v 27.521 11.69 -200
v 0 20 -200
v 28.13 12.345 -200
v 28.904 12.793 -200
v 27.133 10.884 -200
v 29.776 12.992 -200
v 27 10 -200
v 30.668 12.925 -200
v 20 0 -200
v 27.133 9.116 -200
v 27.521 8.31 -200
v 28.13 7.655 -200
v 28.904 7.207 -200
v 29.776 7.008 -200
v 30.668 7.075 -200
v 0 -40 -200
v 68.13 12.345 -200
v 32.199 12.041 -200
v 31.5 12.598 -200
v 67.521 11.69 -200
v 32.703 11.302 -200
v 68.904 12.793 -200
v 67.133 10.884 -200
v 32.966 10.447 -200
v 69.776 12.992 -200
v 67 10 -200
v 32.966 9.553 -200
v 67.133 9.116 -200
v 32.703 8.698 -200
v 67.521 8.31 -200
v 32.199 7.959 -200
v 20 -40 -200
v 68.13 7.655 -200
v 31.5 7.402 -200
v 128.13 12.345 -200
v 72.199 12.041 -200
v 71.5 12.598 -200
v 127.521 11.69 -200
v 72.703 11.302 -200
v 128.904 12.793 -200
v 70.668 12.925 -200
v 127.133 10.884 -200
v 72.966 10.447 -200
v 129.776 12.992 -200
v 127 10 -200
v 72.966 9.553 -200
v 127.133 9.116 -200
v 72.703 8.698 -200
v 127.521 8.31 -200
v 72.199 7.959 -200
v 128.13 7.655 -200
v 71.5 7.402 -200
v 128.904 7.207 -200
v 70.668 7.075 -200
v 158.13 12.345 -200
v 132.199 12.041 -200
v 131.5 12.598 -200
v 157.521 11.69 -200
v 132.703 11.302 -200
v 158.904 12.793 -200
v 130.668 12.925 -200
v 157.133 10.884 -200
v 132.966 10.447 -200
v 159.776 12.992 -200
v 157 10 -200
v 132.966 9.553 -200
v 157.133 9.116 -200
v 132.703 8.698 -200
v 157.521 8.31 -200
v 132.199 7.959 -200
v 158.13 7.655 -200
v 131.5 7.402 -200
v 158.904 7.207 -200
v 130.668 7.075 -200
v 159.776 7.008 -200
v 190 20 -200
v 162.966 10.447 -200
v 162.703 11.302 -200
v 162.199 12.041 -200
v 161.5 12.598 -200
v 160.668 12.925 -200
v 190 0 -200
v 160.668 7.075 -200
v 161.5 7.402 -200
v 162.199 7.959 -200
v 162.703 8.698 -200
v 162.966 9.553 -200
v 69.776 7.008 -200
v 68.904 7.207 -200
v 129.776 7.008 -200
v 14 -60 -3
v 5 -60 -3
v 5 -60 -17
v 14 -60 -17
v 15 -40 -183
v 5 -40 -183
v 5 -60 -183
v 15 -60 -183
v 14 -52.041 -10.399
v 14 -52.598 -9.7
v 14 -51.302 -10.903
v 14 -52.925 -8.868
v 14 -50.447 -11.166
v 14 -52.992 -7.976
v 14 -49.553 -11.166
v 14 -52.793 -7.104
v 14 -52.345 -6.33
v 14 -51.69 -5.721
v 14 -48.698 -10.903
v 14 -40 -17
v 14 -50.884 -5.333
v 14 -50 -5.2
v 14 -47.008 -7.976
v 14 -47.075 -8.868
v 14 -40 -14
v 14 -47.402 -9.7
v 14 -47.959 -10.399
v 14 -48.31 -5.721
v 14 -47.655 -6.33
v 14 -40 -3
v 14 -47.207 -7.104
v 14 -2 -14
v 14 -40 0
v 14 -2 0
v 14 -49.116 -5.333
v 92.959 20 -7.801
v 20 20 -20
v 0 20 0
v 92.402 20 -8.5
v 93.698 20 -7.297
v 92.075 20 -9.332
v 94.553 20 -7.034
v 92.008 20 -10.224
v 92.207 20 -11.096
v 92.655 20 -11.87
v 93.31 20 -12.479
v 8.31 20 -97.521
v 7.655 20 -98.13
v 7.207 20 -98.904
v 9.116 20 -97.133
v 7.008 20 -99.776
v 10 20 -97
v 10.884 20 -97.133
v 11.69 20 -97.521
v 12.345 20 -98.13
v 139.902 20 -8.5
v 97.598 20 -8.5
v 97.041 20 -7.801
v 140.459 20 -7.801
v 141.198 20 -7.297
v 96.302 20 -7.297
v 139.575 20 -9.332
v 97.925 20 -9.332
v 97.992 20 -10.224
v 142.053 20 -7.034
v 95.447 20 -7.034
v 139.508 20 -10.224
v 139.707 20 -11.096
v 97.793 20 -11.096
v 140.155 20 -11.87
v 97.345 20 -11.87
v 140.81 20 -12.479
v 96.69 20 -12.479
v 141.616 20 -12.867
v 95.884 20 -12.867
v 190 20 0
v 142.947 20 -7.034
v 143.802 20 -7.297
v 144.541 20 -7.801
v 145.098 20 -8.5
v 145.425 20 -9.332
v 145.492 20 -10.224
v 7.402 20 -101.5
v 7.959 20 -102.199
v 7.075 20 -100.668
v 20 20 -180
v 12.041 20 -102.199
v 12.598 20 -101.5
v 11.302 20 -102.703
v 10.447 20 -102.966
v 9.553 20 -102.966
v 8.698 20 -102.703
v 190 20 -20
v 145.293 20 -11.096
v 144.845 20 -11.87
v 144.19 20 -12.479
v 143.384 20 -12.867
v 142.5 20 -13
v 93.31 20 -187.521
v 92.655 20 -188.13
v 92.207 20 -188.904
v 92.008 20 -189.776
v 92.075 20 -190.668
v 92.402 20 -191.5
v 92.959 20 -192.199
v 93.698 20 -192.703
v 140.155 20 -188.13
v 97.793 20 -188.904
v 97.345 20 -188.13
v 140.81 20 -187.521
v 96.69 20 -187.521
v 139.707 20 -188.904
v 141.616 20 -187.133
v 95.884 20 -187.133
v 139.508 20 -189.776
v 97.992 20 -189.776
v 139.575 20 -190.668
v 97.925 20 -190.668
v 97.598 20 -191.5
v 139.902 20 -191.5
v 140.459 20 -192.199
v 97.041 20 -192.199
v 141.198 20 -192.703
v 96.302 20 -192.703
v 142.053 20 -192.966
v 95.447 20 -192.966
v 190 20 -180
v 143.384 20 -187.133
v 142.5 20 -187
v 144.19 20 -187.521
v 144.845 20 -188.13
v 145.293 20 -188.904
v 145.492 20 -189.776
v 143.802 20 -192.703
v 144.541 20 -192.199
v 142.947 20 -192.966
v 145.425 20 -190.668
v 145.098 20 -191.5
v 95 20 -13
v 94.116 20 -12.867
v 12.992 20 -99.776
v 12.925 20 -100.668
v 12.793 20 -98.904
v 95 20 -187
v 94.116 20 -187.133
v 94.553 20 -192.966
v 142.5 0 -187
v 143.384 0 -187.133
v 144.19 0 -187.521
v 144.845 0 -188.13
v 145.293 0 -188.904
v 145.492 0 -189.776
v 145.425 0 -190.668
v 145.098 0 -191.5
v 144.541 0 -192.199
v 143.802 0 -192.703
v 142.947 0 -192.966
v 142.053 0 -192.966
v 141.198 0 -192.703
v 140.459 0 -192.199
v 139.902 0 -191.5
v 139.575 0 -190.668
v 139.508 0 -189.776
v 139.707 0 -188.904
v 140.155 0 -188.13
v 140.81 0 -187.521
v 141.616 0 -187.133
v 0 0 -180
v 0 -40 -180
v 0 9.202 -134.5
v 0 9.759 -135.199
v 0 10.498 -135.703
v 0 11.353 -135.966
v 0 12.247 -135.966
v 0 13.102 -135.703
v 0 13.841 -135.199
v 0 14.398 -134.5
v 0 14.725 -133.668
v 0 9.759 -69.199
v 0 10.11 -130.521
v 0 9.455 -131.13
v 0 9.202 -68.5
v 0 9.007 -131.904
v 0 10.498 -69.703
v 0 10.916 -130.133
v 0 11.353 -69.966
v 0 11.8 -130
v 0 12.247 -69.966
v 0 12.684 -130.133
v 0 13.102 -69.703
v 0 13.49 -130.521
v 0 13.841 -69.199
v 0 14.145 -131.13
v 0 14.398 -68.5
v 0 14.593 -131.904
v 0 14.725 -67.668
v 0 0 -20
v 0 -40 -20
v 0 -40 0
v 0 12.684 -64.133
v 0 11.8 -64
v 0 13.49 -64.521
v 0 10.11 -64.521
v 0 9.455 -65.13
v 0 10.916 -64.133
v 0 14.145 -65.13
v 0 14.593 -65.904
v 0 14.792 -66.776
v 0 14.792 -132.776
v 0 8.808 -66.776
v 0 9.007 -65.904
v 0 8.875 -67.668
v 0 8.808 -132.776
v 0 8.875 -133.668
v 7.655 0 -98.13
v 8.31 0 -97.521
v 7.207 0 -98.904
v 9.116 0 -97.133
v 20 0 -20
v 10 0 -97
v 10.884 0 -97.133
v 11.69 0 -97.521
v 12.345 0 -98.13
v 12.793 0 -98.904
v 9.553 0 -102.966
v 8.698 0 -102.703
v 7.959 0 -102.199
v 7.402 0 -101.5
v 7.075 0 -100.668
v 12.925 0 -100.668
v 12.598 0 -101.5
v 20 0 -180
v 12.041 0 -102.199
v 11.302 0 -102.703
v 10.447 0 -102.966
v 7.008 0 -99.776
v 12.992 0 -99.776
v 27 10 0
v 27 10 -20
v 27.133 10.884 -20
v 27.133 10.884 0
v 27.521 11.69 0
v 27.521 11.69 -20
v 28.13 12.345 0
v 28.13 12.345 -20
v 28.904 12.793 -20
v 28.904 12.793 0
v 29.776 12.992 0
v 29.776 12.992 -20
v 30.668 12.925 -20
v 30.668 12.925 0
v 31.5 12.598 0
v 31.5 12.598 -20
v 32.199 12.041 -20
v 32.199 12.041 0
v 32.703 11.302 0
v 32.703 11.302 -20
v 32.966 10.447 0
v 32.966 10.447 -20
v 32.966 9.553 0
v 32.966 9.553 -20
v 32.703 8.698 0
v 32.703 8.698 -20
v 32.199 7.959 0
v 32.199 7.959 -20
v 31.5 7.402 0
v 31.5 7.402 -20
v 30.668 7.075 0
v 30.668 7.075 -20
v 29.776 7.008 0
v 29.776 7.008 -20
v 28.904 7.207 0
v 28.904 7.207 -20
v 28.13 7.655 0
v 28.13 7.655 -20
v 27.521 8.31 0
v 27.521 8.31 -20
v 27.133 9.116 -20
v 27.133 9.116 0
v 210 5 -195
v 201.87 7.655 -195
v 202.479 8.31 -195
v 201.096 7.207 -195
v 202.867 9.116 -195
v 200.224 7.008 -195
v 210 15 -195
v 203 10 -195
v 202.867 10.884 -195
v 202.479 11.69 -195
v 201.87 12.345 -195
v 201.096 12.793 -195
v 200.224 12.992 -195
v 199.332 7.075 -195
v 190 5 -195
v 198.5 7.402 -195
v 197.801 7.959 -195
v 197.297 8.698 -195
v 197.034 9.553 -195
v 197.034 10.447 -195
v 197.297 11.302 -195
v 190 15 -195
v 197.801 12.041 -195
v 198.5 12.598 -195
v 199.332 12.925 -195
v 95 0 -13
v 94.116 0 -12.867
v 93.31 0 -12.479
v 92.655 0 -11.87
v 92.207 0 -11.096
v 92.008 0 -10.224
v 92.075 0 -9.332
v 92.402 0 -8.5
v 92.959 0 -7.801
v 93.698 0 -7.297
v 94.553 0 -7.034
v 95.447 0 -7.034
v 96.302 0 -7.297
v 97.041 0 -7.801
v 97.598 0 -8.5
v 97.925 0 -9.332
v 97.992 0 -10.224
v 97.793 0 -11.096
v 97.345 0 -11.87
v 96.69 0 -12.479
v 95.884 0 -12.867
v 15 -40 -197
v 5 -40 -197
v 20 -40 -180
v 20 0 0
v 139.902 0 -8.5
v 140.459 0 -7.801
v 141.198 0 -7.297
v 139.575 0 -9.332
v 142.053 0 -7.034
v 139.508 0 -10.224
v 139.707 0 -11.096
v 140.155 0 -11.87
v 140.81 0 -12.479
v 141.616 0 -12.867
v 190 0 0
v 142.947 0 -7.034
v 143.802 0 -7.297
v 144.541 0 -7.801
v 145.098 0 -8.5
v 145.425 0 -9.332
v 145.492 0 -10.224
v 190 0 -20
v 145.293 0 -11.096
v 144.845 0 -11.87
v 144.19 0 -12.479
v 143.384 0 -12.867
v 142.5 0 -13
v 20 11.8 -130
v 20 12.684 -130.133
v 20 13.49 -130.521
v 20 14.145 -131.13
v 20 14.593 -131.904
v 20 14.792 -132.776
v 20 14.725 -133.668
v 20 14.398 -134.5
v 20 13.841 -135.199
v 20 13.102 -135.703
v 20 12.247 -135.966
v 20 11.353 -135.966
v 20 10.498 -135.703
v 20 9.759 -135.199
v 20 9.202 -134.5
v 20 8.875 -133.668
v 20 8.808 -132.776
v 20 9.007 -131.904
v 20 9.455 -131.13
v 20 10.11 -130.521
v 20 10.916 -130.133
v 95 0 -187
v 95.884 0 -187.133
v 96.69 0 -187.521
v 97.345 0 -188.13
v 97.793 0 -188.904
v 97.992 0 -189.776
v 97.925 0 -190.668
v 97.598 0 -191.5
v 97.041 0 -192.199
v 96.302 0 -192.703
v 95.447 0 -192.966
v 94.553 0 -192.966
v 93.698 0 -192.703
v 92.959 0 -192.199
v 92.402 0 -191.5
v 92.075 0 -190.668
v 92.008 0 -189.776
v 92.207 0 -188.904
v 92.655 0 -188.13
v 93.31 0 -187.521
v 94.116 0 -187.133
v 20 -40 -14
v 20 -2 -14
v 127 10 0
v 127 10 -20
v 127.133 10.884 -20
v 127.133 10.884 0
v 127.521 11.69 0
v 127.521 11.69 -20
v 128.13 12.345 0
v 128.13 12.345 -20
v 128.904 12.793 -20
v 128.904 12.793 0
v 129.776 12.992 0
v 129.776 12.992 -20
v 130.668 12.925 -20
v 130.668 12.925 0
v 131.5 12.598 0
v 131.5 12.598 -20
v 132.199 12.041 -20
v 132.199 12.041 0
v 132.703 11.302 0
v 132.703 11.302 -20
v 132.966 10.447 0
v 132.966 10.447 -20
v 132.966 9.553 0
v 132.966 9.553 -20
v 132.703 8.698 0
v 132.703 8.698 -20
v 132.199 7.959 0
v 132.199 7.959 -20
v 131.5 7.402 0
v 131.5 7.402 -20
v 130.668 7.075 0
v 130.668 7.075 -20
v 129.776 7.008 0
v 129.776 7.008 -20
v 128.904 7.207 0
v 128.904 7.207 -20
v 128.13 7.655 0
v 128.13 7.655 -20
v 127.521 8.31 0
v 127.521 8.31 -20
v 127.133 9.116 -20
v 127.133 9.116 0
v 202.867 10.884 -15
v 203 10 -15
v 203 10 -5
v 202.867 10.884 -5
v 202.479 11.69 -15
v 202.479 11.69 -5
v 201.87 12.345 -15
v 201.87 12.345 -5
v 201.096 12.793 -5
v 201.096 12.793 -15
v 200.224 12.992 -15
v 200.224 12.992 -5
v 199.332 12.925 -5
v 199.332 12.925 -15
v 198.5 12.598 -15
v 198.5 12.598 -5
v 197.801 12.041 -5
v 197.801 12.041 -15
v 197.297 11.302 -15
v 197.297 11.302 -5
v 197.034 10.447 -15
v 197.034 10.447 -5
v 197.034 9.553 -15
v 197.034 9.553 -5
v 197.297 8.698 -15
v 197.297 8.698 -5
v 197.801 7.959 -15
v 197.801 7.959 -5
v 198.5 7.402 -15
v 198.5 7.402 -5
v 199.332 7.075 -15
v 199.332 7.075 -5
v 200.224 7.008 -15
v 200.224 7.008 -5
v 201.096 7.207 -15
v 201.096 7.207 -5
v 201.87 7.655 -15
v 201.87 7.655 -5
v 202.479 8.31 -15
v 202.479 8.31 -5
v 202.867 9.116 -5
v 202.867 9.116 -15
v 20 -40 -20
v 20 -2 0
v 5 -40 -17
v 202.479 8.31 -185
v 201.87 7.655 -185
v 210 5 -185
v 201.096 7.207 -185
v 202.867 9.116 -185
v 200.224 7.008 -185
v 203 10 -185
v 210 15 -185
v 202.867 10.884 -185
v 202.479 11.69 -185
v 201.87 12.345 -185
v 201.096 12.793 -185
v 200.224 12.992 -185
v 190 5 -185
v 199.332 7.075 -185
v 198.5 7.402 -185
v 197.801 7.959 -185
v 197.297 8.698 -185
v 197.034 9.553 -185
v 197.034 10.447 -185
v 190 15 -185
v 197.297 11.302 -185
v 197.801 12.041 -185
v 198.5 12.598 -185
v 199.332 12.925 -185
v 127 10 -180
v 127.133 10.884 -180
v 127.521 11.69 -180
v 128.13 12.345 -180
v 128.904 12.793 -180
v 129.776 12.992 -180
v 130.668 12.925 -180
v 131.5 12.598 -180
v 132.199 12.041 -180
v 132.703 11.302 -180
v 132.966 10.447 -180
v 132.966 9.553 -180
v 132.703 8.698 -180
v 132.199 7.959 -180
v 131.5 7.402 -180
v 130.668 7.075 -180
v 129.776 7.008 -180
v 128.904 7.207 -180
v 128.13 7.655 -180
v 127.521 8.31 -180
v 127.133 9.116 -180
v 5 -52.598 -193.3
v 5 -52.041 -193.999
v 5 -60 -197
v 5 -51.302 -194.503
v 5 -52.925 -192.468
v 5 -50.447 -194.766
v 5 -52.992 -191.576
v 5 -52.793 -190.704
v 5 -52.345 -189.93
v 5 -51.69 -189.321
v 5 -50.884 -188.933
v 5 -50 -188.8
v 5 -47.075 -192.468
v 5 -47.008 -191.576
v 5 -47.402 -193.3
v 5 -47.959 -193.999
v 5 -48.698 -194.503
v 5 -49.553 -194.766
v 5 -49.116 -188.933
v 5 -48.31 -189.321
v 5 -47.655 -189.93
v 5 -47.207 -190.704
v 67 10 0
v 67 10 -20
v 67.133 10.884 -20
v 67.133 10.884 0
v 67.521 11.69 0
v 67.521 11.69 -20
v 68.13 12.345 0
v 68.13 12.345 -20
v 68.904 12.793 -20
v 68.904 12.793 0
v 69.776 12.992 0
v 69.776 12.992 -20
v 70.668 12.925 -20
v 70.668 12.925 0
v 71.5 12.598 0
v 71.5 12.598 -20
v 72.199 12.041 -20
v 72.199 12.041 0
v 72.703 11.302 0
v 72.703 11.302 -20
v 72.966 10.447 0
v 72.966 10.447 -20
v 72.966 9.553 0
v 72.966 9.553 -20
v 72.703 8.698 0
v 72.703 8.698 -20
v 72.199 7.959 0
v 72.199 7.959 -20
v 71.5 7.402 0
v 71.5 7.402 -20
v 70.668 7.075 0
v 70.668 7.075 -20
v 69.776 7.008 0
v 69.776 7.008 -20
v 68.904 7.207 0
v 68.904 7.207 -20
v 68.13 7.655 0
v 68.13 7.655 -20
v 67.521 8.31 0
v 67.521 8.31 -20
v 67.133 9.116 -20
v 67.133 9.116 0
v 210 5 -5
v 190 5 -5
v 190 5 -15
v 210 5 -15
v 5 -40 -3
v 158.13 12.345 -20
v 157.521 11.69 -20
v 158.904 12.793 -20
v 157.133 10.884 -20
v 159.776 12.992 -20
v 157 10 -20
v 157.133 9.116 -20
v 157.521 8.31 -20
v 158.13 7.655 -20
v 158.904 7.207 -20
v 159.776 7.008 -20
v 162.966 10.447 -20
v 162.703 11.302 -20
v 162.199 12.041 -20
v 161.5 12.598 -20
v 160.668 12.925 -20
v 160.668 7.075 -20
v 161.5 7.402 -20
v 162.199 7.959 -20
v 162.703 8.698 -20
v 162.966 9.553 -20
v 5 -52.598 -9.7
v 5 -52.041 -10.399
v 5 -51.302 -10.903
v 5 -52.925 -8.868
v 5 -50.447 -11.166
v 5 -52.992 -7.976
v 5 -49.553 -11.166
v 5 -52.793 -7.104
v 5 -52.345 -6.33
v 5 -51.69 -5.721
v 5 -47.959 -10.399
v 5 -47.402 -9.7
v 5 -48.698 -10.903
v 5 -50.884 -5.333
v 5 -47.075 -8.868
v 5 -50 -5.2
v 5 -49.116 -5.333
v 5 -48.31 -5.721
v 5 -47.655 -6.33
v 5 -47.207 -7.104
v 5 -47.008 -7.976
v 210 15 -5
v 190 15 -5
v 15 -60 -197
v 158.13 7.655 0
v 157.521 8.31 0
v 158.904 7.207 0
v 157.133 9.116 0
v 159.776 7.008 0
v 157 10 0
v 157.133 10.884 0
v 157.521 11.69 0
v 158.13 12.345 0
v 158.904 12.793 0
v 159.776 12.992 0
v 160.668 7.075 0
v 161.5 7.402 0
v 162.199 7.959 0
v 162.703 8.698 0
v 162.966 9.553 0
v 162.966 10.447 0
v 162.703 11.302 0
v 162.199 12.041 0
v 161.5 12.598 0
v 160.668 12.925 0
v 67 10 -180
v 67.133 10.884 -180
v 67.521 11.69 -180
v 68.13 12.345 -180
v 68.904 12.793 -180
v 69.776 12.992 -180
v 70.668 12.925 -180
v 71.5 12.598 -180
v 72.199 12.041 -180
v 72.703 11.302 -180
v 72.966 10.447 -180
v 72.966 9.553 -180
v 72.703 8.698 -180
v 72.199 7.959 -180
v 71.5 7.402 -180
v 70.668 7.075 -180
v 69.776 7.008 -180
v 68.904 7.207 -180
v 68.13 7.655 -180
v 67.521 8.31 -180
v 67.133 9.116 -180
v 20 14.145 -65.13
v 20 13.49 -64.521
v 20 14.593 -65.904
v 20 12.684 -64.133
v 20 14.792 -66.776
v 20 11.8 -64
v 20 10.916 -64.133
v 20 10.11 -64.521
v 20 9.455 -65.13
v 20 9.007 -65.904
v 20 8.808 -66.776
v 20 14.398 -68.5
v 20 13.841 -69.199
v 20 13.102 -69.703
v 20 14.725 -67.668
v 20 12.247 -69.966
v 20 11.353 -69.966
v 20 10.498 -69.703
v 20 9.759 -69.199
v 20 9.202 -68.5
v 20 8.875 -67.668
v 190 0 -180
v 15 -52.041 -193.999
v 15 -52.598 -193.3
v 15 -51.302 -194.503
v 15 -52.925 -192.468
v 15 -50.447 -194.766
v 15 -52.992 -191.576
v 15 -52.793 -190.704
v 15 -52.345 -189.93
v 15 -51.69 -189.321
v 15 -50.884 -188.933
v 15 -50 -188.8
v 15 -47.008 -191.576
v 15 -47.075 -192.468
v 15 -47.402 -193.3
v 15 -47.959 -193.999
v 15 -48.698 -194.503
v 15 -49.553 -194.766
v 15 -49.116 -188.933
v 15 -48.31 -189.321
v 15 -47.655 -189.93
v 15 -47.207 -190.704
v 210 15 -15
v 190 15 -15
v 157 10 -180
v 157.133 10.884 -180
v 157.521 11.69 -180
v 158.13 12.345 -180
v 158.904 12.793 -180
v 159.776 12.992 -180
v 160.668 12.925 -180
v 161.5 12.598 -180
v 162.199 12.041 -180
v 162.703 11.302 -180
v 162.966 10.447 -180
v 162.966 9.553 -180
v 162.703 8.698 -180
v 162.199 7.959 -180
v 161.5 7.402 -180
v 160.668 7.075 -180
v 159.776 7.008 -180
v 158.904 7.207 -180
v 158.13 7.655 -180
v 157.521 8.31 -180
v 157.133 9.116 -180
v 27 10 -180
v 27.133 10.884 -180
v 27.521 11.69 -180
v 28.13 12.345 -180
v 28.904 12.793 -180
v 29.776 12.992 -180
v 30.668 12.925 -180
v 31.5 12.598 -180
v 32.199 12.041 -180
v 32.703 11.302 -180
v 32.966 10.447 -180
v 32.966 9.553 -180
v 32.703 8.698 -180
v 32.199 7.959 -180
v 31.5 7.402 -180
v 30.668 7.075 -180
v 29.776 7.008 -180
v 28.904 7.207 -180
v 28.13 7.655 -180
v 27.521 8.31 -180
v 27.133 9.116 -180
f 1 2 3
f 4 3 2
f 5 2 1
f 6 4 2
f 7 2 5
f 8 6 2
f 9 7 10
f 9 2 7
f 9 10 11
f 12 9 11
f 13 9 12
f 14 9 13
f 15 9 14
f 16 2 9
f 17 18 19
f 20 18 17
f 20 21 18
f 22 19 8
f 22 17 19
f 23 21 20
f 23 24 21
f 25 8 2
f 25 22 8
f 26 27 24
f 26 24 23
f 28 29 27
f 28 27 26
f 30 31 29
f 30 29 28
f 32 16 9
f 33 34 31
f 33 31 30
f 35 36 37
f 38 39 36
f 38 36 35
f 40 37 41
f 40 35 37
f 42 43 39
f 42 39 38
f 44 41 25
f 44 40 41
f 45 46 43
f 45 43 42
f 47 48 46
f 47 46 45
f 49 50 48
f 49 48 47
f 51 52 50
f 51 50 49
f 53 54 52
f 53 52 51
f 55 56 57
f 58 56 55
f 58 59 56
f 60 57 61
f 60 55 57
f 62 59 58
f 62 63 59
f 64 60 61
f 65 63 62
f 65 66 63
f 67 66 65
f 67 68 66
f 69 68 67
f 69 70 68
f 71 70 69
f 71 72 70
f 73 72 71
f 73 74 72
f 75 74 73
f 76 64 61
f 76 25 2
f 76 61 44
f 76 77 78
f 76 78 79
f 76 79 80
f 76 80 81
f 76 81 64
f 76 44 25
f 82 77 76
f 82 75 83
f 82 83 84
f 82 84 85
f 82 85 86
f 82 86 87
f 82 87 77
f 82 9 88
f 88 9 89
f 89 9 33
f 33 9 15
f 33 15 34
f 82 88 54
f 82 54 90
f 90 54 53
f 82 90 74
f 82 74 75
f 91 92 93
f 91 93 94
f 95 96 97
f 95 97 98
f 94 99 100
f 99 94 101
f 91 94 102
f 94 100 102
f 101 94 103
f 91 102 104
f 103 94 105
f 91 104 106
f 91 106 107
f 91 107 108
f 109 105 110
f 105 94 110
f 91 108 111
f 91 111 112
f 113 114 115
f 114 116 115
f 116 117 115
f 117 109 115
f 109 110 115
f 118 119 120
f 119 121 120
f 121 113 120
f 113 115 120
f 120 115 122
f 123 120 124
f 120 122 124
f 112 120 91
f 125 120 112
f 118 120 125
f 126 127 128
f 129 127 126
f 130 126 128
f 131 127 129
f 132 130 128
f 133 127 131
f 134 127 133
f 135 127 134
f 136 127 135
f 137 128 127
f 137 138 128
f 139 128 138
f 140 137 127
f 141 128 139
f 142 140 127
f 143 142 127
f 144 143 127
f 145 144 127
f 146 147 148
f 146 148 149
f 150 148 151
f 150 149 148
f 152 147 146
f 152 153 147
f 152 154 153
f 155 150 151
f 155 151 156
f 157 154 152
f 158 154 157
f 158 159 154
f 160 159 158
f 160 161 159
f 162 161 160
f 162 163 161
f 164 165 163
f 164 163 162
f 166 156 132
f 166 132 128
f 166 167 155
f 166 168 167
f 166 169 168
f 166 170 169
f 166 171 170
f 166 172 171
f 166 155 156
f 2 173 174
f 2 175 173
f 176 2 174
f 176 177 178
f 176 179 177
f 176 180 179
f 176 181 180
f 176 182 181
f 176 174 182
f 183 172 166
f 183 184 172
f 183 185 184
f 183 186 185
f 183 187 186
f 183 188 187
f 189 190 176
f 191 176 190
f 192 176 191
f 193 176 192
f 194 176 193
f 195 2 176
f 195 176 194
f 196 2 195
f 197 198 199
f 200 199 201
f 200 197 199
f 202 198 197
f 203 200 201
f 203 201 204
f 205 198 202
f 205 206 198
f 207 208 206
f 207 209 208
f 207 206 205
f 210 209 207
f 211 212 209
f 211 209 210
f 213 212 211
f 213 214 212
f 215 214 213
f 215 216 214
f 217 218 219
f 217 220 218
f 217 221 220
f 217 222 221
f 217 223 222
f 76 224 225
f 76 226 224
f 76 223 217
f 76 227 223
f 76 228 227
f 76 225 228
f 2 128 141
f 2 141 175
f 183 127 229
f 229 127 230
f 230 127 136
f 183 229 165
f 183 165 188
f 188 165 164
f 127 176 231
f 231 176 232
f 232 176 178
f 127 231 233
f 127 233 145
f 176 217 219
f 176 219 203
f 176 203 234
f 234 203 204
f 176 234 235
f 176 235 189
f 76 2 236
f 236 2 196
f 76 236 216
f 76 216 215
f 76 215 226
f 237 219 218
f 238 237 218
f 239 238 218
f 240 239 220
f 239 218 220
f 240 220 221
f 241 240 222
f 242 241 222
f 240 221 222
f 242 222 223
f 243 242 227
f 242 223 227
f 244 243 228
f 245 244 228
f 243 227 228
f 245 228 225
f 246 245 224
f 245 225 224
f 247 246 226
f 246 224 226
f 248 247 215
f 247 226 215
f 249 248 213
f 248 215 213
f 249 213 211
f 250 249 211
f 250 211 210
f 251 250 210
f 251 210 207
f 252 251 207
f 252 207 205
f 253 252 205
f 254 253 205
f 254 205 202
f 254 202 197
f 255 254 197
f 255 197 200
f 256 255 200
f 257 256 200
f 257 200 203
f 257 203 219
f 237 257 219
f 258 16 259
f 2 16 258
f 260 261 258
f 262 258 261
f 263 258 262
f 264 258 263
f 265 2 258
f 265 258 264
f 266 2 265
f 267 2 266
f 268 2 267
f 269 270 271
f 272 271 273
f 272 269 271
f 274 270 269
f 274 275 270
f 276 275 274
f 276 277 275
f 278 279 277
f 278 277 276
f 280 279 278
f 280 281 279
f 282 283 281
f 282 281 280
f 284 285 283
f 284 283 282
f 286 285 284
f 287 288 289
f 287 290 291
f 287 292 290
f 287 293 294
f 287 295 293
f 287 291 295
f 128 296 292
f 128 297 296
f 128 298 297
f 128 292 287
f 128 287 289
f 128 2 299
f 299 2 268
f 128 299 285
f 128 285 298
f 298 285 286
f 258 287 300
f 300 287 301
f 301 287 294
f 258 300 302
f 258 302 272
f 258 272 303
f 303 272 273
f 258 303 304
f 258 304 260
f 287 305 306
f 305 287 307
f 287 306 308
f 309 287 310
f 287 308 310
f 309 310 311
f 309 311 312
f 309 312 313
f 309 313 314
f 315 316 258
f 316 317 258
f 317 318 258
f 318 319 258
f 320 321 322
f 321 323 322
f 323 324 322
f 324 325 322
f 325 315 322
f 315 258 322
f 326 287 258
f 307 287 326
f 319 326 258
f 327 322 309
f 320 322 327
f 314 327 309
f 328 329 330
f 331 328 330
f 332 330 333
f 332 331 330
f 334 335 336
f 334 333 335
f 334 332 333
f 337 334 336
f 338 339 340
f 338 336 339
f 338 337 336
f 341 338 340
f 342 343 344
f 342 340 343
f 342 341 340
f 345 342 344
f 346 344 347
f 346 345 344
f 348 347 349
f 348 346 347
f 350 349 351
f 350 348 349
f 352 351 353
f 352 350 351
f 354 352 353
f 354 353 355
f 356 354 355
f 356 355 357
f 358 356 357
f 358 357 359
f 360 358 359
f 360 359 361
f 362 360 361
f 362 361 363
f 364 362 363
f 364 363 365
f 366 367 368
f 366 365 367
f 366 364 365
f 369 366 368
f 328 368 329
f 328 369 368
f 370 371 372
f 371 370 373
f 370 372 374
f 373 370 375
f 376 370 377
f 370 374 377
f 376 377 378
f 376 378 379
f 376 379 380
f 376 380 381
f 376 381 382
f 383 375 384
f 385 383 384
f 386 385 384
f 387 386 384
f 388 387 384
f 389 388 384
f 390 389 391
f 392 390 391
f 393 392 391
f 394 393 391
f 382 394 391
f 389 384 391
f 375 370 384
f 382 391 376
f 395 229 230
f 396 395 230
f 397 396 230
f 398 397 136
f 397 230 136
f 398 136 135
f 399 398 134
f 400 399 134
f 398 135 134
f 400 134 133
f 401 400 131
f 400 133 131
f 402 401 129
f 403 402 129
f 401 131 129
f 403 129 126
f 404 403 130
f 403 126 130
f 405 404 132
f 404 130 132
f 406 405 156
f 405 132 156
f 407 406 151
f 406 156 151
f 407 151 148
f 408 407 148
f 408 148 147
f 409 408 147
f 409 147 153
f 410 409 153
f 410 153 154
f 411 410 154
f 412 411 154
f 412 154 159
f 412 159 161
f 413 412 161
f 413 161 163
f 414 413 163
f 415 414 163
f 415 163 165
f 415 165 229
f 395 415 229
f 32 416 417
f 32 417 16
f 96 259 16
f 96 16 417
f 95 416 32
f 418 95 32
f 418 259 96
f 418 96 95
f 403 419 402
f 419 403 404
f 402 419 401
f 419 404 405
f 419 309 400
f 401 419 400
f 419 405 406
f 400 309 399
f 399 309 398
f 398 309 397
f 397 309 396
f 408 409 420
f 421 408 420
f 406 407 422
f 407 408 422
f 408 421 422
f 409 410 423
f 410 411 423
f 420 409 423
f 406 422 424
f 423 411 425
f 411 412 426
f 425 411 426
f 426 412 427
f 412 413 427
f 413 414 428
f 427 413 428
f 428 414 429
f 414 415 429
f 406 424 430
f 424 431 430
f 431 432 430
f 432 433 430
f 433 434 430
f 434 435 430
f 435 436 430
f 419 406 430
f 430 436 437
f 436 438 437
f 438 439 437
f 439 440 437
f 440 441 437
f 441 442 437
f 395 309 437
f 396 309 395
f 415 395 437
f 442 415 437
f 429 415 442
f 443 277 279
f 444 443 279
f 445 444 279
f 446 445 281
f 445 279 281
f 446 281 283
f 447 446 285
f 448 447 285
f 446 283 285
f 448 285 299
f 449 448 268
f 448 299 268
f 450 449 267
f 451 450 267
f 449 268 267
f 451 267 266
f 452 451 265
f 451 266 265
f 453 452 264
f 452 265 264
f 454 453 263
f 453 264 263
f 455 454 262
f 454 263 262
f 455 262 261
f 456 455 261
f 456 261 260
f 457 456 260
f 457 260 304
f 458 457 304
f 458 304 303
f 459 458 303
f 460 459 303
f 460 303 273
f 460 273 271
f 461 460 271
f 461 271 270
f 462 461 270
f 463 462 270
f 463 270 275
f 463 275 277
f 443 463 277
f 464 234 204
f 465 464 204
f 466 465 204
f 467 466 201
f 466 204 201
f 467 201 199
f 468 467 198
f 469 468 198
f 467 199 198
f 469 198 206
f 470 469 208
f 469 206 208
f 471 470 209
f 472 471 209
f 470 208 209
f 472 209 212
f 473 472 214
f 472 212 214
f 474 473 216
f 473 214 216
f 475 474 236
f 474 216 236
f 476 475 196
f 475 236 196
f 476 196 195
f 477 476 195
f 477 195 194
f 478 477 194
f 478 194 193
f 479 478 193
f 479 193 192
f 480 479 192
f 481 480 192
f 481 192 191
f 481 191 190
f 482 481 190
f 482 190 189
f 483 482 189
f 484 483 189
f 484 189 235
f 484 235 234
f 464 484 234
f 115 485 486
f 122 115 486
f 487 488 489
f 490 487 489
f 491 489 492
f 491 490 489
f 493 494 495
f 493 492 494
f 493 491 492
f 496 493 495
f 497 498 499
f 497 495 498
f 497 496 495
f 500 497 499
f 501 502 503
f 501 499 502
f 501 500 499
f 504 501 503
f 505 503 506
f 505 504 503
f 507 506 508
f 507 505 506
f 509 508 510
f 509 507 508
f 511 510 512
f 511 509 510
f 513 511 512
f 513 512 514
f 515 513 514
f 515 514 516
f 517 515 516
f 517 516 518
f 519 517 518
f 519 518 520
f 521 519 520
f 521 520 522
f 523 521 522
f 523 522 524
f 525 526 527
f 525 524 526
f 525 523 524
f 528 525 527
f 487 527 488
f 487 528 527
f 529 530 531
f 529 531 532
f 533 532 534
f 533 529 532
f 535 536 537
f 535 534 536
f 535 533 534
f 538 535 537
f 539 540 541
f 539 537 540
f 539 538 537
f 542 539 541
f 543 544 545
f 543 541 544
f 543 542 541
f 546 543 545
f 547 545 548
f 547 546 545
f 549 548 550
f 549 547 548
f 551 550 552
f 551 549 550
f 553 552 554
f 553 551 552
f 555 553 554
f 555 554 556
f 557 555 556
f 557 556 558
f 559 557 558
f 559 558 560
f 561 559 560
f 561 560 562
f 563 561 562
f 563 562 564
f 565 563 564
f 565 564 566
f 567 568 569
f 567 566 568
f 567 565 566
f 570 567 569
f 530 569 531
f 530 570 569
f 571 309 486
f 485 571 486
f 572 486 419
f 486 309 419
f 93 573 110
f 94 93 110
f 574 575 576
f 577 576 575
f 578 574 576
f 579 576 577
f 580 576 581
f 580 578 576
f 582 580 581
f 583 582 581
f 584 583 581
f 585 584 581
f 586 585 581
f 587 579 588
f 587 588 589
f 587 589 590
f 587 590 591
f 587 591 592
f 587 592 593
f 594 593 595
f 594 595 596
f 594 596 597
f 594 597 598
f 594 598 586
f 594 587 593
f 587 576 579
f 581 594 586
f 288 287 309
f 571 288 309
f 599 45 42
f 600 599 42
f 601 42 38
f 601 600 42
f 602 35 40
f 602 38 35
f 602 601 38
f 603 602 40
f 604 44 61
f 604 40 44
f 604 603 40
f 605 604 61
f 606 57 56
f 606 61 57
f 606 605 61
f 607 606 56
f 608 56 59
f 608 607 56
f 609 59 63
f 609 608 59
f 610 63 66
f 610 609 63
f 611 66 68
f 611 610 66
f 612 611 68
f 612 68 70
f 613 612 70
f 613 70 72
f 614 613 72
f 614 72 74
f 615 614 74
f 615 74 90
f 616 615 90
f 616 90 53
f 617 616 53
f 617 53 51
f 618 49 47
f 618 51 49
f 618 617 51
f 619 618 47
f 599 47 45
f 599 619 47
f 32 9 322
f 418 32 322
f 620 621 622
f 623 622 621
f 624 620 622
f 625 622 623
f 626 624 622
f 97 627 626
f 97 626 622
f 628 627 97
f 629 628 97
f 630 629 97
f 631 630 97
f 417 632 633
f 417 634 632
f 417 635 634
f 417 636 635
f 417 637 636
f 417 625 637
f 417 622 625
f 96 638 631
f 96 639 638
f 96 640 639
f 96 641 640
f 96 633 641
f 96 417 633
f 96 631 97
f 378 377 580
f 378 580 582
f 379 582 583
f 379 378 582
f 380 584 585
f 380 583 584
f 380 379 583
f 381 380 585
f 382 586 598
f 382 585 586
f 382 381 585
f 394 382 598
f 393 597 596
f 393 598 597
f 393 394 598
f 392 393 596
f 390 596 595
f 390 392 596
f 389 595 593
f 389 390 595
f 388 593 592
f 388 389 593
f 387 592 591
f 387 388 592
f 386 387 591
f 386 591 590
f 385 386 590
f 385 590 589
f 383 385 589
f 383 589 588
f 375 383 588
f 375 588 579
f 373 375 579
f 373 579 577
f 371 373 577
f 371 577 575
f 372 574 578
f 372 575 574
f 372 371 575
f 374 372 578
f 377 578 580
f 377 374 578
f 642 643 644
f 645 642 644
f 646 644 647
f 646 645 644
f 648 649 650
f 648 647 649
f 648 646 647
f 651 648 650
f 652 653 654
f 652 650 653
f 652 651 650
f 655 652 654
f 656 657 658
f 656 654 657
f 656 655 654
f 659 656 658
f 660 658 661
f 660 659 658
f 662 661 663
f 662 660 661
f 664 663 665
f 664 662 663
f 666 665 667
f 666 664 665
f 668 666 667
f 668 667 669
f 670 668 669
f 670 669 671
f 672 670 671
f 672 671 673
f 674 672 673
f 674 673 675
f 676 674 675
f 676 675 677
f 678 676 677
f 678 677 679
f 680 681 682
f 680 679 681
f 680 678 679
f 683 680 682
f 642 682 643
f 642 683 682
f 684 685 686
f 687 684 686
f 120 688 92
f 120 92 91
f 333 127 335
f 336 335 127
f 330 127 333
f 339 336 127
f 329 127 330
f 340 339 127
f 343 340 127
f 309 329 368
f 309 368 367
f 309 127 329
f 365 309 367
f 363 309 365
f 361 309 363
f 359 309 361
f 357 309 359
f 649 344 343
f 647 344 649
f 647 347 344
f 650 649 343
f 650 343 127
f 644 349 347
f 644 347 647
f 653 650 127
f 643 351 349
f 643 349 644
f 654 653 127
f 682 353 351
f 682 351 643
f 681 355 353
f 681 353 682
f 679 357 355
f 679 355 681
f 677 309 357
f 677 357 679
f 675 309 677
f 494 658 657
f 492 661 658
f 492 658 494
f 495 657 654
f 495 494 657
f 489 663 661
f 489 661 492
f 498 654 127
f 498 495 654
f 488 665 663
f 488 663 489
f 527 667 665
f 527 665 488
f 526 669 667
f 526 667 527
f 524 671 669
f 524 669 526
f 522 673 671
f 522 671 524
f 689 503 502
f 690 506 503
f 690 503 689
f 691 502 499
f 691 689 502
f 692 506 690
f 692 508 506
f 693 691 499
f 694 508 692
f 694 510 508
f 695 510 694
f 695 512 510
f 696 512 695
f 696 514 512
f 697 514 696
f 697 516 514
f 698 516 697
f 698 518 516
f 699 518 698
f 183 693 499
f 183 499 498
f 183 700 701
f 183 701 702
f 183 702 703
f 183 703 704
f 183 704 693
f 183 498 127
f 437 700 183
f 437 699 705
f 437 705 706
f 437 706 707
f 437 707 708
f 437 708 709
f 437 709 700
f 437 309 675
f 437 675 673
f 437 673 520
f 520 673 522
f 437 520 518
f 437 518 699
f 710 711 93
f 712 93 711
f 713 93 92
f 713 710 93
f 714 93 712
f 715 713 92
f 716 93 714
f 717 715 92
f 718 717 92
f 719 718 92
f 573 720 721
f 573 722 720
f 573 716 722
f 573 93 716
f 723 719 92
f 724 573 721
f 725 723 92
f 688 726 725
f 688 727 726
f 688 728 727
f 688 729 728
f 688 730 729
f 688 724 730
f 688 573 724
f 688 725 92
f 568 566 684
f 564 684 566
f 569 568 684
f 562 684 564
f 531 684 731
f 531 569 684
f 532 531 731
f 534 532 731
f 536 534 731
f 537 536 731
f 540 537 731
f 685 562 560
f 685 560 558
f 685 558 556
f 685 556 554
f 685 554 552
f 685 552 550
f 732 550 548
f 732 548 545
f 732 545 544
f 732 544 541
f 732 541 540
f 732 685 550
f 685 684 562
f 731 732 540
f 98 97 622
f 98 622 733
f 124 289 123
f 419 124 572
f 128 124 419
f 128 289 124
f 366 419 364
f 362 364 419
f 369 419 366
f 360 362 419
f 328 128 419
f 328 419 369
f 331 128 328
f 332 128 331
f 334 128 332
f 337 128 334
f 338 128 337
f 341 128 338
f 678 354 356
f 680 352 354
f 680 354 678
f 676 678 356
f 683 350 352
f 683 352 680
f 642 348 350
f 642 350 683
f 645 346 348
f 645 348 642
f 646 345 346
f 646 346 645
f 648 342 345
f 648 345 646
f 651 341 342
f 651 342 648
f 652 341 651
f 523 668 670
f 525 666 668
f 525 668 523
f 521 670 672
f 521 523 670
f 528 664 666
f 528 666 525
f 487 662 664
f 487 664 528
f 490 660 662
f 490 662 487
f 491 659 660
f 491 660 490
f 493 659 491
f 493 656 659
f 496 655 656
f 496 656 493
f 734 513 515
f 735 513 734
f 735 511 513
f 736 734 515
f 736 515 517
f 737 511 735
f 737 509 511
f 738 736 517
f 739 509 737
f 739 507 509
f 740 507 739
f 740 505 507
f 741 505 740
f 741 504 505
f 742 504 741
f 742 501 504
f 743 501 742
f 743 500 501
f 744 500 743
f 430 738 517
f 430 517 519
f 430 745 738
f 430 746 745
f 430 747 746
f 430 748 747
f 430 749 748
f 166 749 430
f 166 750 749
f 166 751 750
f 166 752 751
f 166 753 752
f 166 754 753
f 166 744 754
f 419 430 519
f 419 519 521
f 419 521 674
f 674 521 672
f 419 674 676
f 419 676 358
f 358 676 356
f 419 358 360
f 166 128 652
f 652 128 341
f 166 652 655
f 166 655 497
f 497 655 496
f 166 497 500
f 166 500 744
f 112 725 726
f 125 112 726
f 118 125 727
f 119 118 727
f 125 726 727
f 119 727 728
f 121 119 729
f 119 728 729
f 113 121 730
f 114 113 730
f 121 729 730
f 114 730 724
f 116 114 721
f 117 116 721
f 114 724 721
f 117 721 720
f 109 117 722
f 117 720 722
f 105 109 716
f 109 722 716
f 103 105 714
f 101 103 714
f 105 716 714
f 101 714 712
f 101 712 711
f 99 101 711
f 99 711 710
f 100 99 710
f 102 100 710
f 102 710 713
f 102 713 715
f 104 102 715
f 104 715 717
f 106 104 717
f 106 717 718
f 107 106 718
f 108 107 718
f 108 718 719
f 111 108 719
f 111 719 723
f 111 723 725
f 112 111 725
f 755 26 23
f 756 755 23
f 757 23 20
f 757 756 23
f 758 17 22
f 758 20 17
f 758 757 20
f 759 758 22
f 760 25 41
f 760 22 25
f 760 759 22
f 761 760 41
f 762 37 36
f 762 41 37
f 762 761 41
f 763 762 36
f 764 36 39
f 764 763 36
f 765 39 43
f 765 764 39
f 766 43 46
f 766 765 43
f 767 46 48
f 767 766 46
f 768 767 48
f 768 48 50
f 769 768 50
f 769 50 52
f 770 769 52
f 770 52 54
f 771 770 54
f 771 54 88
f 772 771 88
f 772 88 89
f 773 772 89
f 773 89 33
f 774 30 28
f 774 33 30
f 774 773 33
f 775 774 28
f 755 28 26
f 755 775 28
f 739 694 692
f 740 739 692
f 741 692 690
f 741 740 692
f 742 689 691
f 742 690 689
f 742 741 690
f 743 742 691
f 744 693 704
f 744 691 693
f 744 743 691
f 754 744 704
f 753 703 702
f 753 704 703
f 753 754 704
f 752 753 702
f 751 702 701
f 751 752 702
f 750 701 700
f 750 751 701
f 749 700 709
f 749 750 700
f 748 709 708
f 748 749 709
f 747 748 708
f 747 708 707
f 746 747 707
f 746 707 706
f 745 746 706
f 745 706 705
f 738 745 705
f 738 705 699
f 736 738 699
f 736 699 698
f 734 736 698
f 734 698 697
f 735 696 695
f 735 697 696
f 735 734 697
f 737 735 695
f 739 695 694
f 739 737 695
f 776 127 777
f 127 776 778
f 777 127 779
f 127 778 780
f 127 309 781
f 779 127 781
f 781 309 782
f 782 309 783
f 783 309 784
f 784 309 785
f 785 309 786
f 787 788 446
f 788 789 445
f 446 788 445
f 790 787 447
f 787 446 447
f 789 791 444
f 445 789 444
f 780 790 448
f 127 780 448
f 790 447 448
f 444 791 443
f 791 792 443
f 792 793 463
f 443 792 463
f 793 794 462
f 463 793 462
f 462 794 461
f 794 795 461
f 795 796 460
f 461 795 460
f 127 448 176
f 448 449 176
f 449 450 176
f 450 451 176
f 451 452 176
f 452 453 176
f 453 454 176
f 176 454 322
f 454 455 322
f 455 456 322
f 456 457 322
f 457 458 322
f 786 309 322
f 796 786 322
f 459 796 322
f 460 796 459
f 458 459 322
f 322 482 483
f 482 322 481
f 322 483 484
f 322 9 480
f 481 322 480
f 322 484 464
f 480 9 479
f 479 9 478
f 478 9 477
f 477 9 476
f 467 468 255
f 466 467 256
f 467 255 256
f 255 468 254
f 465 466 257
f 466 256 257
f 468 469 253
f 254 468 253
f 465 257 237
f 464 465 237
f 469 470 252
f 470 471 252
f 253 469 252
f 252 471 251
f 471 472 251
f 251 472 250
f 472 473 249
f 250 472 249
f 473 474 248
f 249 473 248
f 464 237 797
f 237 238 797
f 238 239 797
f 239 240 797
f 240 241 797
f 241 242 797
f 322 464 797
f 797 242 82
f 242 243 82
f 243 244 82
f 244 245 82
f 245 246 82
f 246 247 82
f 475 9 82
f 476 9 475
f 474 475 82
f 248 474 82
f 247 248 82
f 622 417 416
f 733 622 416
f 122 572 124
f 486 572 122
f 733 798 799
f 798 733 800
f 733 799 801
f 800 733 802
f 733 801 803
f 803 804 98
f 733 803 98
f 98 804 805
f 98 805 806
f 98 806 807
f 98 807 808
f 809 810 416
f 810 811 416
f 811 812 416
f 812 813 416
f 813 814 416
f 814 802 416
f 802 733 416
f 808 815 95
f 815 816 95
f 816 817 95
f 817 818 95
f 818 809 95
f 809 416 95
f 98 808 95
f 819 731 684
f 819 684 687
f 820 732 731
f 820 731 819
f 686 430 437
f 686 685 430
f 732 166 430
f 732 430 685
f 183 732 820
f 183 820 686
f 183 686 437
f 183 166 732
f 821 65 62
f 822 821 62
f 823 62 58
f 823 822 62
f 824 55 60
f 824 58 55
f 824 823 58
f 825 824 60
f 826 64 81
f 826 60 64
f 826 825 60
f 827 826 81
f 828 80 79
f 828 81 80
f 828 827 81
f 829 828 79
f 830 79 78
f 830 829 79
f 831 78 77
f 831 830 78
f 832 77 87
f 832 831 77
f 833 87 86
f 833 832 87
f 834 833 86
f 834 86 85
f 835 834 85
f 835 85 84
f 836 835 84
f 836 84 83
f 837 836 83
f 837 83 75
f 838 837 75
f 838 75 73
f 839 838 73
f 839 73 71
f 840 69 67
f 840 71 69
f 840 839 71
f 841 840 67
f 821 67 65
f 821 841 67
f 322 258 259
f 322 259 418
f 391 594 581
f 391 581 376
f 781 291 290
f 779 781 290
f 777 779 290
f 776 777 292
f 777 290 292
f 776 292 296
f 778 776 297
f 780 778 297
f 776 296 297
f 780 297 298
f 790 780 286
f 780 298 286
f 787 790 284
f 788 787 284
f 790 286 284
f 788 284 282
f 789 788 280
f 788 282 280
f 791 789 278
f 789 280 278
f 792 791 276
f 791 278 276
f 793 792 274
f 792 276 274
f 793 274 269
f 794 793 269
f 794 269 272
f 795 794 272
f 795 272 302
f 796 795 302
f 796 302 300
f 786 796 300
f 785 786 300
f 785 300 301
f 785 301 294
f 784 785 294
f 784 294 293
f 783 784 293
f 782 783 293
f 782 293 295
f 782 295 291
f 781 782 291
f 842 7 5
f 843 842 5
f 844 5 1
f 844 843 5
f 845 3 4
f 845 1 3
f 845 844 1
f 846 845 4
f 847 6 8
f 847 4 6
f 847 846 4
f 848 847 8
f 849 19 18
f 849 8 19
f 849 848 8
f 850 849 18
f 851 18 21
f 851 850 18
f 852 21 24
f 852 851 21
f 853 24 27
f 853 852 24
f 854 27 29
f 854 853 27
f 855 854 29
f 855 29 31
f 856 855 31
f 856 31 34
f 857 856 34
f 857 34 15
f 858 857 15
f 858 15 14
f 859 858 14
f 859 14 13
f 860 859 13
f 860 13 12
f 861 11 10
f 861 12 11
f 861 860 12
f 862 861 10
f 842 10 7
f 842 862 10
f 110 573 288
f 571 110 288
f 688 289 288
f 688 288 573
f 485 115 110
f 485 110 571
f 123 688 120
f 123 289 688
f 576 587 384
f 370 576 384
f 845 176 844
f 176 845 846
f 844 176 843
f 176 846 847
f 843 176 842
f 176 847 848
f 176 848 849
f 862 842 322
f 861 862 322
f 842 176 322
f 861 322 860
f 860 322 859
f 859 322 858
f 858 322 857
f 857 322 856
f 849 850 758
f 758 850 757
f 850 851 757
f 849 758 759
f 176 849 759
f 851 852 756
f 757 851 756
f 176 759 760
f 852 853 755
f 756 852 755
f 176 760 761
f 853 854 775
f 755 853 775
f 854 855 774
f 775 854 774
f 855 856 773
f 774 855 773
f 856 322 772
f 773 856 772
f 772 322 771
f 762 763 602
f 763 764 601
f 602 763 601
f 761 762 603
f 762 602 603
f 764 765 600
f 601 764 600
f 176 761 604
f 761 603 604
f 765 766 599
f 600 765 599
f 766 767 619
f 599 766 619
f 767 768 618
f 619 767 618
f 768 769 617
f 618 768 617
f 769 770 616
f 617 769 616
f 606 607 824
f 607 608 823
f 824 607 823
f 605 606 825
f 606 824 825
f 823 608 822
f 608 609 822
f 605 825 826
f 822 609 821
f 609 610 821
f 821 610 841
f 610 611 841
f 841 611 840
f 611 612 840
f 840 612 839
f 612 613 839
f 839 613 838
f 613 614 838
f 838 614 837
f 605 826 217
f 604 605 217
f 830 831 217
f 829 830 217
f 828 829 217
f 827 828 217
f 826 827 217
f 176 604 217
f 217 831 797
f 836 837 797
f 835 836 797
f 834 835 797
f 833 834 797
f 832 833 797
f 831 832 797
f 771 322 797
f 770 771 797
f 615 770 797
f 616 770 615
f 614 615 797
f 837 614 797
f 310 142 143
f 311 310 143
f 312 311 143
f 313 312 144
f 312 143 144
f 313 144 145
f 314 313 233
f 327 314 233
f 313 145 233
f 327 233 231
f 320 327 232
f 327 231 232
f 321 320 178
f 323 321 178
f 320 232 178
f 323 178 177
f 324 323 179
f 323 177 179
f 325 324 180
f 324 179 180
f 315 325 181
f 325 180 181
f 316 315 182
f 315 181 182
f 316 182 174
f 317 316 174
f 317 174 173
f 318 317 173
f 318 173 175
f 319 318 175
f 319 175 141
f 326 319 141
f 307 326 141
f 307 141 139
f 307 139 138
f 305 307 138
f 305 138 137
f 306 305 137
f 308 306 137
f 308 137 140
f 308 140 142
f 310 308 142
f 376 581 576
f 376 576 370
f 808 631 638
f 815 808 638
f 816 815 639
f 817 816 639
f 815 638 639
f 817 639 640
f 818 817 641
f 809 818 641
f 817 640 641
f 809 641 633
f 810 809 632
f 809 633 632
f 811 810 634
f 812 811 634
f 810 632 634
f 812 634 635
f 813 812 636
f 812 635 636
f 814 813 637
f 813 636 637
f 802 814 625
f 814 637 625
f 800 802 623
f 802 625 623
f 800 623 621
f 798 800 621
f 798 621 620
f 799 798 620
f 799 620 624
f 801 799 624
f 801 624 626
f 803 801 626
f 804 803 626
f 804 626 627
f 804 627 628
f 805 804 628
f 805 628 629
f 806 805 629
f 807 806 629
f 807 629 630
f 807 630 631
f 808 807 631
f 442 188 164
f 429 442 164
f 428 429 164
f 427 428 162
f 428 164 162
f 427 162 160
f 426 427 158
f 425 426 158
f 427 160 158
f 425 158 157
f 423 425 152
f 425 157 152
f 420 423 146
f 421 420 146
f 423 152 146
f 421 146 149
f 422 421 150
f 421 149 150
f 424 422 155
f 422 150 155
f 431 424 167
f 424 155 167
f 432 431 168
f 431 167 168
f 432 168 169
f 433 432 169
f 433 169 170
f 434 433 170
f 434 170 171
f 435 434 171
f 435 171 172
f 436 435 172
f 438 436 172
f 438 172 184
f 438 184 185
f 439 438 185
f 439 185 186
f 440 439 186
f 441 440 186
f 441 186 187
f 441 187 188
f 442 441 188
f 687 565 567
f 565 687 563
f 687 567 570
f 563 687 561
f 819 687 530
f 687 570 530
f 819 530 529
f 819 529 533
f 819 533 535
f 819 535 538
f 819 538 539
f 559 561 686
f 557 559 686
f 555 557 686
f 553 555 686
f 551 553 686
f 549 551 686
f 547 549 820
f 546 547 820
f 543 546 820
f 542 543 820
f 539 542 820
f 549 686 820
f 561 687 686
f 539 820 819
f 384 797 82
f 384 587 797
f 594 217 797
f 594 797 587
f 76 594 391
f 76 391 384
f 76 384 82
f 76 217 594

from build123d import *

# Parameters (mm, degrees)
SKETCH1_W               = 320
SKETCH1_H               = 200
SKETCH1_W_2             = 280
SKETCH1_H_2             = 160
BOSS_EXTRUDE1_DEPTH     = 20
SKETCH2_W               = 130
SKETCH2_H               = 200
CUT_EXTRUDE1_DEPTH      = 20
SKETCH5_W               = 20
SKETCH5_H               = 20
BOSS_EXTRUDE4_DEPTH     = 40
SKETCH8_W               = 10
SKETCH8_H               = 14
BOSS_EXTRUDE5_DEPTH     = 20
SKETCH9_W               = 10
SKETCH9_H               = 14
BOSS_EXTRUDE6_DEPTH     = 20
SKETCH10_W              = 10
SKETCH10_H              = 10
BOSS_EXTRUDE7_DEPTH     = 20
SKETCH11_R              = 3
CUT_EXTRUDE2_DEPTH      = 30
SKETCH13_R              = 3
CUT_EXTRUDE3_DEPTH      = 30
CUT_EXTRUDE4_DEPTH      = 297.141857899
CUT_EXTRUDE4_DEPTH_BACK = 297.141857899
SKETCH14_R              = 3
CUT_EXTRUDE5_DEPTH      = 293.788319439
CUT_EXTRUDE5_DEPTH_BACK = 293.788319439
SKETCH16_R              = 3
SKETCH17_W              = 14
SKETCH17_H              = 38
CUT_EXTRUDE6_DEPTH      = 5
CUT_EXTRUDE7_DEPTH      = 1


with BuildPart() as part:
    # Sketch1 → Boss-Extrude1 (new body)
    with BuildSketch(Plane(origin=(0, 0, 0), x_dir=(1, 0, 0), z_dir=(0, 1, 0))):
        with Locations((160, 100)):
            Rectangle(SKETCH1_W, SKETCH1_H)
        with Locations((160, 100)):
            Rectangle(SKETCH1_W_2, SKETCH1_H_2, mode=Mode.SUBTRACT)
    extrude(amount=BOSS_EXTRUDE1_DEPTH)

    # Sketch2 → Cut-Extrude1 (cut)
    with BuildSketch(Plane(origin=(0, 20, 0), x_dir=(1, 0, 0), z_dir=(0, 1, 0))):
        with Locations((255, 100)):
            Rectangle(SKETCH2_W, SKETCH2_H)
    extrude(amount=-CUT_EXTRUDE1_DEPTH, mode=Mode.SUBTRACT)

    # Sketch5 → Boss-Extrude4 (add)
    with BuildSketch(Plane.XZ):
        with Locations((10, -10)):
            Rectangle(SKETCH5_W, SKETCH5_H)
        with Locations((10, -190)):
            Rectangle(SKETCH5_W, SKETCH5_H)
    extrude(amount=BOSS_EXTRUDE4_DEPTH)

    # Sketch8 → Boss-Extrude5 (add)
    with BuildSketch(Plane.XZ.offset(40)):
        with Locations((10, -10)):
            Rectangle(SKETCH8_W, SKETCH8_H)
    extrude(amount=BOSS_EXTRUDE5_DEPTH)

    # Sketch9 → Boss-Extrude6 (add)
    with BuildSketch(Plane.XZ.offset(40)):
        with Locations((10, -190)):
            Rectangle(SKETCH9_W, SKETCH9_H)
    extrude(amount=BOSS_EXTRUDE6_DEPTH)

    # Sketch10 → Boss-Extrude7 (add)
    with BuildSketch(Plane(origin=(190, 0, 0), x_dir=(0, 0, -1), z_dir=(1, 0, 0))):
        with Locations((190, 10)):
            Rectangle(SKETCH10_W, SKETCH10_H)
        with Locations((10, 10)):
            Rectangle(SKETCH10_W, SKETCH10_H)
    extrude(amount=BOSS_EXTRUDE7_DEPTH)

    # Sketch11 → Cut-Extrude2 (cut)
    with BuildSketch(Plane(origin=(0, 20, 0), x_dir=(1, 0, 0), z_dir=(0, 1, 0))):
        with Locations(Location((142.5, 190, 0), (0, 0, 270))):
            Circle(SKETCH11_R)
        with Locations(Location((95, 190, 0), (0, 0, 270))):
            Circle(SKETCH11_R)
        with Locations(Location((10, 100, 0), (0, 0, 270))):
            Circle(SKETCH11_R)
        with Locations(Location((142.5, 10, 0), (0, 0, 90))):
            Circle(SKETCH11_R)
        with Locations(Location((95, 10, 0), (0, 0, 90))):
            Circle(SKETCH11_R)
    extrude(amount=-CUT_EXTRUDE2_DEPTH, mode=Mode.SUBTRACT)

    # Sketch13 → Cut-Extrude3 (cut)
    with BuildSketch(Plane.ZY):
        with Locations((-8.2, -50)):
            Circle(SKETCH13_R)
        with Locations((-67, 11.8)):
            Circle(SKETCH13_R)
        with Locations((-133, 11.8)):
            Circle(SKETCH13_R)
        with Locations((-191.8, -50)):
            Circle(SKETCH13_R)
    extrude(amount=-CUT_EXTRUDE3_DEPTH, mode=Mode.SUBTRACT)

    # Sketch14 → Cut-Extrude4 (cut, two sides: drawn at the far end of the back side and taken through both)
    with BuildSketch(Plane(origin=(0, 0, -200), x_dir=(-1, 0, 0), z_dir=(0, 0, -1)).offset(-CUT_EXTRUDE4_DEPTH_BACK)):
        with Locations((-160, 10)):
            Circle(SKETCH14_R)
        with Locations((-30, 10)):
            Circle(SKETCH14_R)
        with Locations((-130, 10)):
            Circle(SKETCH14_R)
        with Locations((-70, 10)):
            Circle(SKETCH14_R)
    extrude(amount=CUT_EXTRUDE4_DEPTH + CUT_EXTRUDE4_DEPTH_BACK, mode=Mode.SUBTRACT)

    # Sketch16 → Cut-Extrude5 (cut, two sides: drawn at the far end of the back side and taken through both)
    with BuildSketch(Plane.XY.offset(-5).offset(-CUT_EXTRUDE5_DEPTH_BACK)):
        with Locations((200, 10)):
            Circle(SKETCH16_R)
    extrude(amount=CUT_EXTRUDE5_DEPTH + CUT_EXTRUDE5_DEPTH_BACK, mode=Mode.SUBTRACT)

    # Sketch17 → Cut-Extrude6 (cut)
    with BuildSketch(Plane(origin=(20, 0, 0), x_dir=(0, 0, -1), z_dir=(1, 0, 0))):
        with Locations((7, -21)):
            Rectangle(SKETCH17_W, SKETCH17_H)
    extrude(amount=-CUT_EXTRUDE6_DEPTH, mode=Mode.SUBTRACT)

    # Sketch18 → Cut-Extrude7 (cut)
    with BuildSketch(Plane(origin=(15, 0, 0), x_dir=(0, 0, -1), z_dir=(1, 0, 0))):
        Polygon((0, -2), (14, -2), (14, -40), (17, -40), (17, -60), (3, -60), (3, -40), (0, -40), align=None)
    extrude(amount=-CUT_EXTRUDE7_DEPTH, mode=Mode.SUBTRACT)


solid = part.part
